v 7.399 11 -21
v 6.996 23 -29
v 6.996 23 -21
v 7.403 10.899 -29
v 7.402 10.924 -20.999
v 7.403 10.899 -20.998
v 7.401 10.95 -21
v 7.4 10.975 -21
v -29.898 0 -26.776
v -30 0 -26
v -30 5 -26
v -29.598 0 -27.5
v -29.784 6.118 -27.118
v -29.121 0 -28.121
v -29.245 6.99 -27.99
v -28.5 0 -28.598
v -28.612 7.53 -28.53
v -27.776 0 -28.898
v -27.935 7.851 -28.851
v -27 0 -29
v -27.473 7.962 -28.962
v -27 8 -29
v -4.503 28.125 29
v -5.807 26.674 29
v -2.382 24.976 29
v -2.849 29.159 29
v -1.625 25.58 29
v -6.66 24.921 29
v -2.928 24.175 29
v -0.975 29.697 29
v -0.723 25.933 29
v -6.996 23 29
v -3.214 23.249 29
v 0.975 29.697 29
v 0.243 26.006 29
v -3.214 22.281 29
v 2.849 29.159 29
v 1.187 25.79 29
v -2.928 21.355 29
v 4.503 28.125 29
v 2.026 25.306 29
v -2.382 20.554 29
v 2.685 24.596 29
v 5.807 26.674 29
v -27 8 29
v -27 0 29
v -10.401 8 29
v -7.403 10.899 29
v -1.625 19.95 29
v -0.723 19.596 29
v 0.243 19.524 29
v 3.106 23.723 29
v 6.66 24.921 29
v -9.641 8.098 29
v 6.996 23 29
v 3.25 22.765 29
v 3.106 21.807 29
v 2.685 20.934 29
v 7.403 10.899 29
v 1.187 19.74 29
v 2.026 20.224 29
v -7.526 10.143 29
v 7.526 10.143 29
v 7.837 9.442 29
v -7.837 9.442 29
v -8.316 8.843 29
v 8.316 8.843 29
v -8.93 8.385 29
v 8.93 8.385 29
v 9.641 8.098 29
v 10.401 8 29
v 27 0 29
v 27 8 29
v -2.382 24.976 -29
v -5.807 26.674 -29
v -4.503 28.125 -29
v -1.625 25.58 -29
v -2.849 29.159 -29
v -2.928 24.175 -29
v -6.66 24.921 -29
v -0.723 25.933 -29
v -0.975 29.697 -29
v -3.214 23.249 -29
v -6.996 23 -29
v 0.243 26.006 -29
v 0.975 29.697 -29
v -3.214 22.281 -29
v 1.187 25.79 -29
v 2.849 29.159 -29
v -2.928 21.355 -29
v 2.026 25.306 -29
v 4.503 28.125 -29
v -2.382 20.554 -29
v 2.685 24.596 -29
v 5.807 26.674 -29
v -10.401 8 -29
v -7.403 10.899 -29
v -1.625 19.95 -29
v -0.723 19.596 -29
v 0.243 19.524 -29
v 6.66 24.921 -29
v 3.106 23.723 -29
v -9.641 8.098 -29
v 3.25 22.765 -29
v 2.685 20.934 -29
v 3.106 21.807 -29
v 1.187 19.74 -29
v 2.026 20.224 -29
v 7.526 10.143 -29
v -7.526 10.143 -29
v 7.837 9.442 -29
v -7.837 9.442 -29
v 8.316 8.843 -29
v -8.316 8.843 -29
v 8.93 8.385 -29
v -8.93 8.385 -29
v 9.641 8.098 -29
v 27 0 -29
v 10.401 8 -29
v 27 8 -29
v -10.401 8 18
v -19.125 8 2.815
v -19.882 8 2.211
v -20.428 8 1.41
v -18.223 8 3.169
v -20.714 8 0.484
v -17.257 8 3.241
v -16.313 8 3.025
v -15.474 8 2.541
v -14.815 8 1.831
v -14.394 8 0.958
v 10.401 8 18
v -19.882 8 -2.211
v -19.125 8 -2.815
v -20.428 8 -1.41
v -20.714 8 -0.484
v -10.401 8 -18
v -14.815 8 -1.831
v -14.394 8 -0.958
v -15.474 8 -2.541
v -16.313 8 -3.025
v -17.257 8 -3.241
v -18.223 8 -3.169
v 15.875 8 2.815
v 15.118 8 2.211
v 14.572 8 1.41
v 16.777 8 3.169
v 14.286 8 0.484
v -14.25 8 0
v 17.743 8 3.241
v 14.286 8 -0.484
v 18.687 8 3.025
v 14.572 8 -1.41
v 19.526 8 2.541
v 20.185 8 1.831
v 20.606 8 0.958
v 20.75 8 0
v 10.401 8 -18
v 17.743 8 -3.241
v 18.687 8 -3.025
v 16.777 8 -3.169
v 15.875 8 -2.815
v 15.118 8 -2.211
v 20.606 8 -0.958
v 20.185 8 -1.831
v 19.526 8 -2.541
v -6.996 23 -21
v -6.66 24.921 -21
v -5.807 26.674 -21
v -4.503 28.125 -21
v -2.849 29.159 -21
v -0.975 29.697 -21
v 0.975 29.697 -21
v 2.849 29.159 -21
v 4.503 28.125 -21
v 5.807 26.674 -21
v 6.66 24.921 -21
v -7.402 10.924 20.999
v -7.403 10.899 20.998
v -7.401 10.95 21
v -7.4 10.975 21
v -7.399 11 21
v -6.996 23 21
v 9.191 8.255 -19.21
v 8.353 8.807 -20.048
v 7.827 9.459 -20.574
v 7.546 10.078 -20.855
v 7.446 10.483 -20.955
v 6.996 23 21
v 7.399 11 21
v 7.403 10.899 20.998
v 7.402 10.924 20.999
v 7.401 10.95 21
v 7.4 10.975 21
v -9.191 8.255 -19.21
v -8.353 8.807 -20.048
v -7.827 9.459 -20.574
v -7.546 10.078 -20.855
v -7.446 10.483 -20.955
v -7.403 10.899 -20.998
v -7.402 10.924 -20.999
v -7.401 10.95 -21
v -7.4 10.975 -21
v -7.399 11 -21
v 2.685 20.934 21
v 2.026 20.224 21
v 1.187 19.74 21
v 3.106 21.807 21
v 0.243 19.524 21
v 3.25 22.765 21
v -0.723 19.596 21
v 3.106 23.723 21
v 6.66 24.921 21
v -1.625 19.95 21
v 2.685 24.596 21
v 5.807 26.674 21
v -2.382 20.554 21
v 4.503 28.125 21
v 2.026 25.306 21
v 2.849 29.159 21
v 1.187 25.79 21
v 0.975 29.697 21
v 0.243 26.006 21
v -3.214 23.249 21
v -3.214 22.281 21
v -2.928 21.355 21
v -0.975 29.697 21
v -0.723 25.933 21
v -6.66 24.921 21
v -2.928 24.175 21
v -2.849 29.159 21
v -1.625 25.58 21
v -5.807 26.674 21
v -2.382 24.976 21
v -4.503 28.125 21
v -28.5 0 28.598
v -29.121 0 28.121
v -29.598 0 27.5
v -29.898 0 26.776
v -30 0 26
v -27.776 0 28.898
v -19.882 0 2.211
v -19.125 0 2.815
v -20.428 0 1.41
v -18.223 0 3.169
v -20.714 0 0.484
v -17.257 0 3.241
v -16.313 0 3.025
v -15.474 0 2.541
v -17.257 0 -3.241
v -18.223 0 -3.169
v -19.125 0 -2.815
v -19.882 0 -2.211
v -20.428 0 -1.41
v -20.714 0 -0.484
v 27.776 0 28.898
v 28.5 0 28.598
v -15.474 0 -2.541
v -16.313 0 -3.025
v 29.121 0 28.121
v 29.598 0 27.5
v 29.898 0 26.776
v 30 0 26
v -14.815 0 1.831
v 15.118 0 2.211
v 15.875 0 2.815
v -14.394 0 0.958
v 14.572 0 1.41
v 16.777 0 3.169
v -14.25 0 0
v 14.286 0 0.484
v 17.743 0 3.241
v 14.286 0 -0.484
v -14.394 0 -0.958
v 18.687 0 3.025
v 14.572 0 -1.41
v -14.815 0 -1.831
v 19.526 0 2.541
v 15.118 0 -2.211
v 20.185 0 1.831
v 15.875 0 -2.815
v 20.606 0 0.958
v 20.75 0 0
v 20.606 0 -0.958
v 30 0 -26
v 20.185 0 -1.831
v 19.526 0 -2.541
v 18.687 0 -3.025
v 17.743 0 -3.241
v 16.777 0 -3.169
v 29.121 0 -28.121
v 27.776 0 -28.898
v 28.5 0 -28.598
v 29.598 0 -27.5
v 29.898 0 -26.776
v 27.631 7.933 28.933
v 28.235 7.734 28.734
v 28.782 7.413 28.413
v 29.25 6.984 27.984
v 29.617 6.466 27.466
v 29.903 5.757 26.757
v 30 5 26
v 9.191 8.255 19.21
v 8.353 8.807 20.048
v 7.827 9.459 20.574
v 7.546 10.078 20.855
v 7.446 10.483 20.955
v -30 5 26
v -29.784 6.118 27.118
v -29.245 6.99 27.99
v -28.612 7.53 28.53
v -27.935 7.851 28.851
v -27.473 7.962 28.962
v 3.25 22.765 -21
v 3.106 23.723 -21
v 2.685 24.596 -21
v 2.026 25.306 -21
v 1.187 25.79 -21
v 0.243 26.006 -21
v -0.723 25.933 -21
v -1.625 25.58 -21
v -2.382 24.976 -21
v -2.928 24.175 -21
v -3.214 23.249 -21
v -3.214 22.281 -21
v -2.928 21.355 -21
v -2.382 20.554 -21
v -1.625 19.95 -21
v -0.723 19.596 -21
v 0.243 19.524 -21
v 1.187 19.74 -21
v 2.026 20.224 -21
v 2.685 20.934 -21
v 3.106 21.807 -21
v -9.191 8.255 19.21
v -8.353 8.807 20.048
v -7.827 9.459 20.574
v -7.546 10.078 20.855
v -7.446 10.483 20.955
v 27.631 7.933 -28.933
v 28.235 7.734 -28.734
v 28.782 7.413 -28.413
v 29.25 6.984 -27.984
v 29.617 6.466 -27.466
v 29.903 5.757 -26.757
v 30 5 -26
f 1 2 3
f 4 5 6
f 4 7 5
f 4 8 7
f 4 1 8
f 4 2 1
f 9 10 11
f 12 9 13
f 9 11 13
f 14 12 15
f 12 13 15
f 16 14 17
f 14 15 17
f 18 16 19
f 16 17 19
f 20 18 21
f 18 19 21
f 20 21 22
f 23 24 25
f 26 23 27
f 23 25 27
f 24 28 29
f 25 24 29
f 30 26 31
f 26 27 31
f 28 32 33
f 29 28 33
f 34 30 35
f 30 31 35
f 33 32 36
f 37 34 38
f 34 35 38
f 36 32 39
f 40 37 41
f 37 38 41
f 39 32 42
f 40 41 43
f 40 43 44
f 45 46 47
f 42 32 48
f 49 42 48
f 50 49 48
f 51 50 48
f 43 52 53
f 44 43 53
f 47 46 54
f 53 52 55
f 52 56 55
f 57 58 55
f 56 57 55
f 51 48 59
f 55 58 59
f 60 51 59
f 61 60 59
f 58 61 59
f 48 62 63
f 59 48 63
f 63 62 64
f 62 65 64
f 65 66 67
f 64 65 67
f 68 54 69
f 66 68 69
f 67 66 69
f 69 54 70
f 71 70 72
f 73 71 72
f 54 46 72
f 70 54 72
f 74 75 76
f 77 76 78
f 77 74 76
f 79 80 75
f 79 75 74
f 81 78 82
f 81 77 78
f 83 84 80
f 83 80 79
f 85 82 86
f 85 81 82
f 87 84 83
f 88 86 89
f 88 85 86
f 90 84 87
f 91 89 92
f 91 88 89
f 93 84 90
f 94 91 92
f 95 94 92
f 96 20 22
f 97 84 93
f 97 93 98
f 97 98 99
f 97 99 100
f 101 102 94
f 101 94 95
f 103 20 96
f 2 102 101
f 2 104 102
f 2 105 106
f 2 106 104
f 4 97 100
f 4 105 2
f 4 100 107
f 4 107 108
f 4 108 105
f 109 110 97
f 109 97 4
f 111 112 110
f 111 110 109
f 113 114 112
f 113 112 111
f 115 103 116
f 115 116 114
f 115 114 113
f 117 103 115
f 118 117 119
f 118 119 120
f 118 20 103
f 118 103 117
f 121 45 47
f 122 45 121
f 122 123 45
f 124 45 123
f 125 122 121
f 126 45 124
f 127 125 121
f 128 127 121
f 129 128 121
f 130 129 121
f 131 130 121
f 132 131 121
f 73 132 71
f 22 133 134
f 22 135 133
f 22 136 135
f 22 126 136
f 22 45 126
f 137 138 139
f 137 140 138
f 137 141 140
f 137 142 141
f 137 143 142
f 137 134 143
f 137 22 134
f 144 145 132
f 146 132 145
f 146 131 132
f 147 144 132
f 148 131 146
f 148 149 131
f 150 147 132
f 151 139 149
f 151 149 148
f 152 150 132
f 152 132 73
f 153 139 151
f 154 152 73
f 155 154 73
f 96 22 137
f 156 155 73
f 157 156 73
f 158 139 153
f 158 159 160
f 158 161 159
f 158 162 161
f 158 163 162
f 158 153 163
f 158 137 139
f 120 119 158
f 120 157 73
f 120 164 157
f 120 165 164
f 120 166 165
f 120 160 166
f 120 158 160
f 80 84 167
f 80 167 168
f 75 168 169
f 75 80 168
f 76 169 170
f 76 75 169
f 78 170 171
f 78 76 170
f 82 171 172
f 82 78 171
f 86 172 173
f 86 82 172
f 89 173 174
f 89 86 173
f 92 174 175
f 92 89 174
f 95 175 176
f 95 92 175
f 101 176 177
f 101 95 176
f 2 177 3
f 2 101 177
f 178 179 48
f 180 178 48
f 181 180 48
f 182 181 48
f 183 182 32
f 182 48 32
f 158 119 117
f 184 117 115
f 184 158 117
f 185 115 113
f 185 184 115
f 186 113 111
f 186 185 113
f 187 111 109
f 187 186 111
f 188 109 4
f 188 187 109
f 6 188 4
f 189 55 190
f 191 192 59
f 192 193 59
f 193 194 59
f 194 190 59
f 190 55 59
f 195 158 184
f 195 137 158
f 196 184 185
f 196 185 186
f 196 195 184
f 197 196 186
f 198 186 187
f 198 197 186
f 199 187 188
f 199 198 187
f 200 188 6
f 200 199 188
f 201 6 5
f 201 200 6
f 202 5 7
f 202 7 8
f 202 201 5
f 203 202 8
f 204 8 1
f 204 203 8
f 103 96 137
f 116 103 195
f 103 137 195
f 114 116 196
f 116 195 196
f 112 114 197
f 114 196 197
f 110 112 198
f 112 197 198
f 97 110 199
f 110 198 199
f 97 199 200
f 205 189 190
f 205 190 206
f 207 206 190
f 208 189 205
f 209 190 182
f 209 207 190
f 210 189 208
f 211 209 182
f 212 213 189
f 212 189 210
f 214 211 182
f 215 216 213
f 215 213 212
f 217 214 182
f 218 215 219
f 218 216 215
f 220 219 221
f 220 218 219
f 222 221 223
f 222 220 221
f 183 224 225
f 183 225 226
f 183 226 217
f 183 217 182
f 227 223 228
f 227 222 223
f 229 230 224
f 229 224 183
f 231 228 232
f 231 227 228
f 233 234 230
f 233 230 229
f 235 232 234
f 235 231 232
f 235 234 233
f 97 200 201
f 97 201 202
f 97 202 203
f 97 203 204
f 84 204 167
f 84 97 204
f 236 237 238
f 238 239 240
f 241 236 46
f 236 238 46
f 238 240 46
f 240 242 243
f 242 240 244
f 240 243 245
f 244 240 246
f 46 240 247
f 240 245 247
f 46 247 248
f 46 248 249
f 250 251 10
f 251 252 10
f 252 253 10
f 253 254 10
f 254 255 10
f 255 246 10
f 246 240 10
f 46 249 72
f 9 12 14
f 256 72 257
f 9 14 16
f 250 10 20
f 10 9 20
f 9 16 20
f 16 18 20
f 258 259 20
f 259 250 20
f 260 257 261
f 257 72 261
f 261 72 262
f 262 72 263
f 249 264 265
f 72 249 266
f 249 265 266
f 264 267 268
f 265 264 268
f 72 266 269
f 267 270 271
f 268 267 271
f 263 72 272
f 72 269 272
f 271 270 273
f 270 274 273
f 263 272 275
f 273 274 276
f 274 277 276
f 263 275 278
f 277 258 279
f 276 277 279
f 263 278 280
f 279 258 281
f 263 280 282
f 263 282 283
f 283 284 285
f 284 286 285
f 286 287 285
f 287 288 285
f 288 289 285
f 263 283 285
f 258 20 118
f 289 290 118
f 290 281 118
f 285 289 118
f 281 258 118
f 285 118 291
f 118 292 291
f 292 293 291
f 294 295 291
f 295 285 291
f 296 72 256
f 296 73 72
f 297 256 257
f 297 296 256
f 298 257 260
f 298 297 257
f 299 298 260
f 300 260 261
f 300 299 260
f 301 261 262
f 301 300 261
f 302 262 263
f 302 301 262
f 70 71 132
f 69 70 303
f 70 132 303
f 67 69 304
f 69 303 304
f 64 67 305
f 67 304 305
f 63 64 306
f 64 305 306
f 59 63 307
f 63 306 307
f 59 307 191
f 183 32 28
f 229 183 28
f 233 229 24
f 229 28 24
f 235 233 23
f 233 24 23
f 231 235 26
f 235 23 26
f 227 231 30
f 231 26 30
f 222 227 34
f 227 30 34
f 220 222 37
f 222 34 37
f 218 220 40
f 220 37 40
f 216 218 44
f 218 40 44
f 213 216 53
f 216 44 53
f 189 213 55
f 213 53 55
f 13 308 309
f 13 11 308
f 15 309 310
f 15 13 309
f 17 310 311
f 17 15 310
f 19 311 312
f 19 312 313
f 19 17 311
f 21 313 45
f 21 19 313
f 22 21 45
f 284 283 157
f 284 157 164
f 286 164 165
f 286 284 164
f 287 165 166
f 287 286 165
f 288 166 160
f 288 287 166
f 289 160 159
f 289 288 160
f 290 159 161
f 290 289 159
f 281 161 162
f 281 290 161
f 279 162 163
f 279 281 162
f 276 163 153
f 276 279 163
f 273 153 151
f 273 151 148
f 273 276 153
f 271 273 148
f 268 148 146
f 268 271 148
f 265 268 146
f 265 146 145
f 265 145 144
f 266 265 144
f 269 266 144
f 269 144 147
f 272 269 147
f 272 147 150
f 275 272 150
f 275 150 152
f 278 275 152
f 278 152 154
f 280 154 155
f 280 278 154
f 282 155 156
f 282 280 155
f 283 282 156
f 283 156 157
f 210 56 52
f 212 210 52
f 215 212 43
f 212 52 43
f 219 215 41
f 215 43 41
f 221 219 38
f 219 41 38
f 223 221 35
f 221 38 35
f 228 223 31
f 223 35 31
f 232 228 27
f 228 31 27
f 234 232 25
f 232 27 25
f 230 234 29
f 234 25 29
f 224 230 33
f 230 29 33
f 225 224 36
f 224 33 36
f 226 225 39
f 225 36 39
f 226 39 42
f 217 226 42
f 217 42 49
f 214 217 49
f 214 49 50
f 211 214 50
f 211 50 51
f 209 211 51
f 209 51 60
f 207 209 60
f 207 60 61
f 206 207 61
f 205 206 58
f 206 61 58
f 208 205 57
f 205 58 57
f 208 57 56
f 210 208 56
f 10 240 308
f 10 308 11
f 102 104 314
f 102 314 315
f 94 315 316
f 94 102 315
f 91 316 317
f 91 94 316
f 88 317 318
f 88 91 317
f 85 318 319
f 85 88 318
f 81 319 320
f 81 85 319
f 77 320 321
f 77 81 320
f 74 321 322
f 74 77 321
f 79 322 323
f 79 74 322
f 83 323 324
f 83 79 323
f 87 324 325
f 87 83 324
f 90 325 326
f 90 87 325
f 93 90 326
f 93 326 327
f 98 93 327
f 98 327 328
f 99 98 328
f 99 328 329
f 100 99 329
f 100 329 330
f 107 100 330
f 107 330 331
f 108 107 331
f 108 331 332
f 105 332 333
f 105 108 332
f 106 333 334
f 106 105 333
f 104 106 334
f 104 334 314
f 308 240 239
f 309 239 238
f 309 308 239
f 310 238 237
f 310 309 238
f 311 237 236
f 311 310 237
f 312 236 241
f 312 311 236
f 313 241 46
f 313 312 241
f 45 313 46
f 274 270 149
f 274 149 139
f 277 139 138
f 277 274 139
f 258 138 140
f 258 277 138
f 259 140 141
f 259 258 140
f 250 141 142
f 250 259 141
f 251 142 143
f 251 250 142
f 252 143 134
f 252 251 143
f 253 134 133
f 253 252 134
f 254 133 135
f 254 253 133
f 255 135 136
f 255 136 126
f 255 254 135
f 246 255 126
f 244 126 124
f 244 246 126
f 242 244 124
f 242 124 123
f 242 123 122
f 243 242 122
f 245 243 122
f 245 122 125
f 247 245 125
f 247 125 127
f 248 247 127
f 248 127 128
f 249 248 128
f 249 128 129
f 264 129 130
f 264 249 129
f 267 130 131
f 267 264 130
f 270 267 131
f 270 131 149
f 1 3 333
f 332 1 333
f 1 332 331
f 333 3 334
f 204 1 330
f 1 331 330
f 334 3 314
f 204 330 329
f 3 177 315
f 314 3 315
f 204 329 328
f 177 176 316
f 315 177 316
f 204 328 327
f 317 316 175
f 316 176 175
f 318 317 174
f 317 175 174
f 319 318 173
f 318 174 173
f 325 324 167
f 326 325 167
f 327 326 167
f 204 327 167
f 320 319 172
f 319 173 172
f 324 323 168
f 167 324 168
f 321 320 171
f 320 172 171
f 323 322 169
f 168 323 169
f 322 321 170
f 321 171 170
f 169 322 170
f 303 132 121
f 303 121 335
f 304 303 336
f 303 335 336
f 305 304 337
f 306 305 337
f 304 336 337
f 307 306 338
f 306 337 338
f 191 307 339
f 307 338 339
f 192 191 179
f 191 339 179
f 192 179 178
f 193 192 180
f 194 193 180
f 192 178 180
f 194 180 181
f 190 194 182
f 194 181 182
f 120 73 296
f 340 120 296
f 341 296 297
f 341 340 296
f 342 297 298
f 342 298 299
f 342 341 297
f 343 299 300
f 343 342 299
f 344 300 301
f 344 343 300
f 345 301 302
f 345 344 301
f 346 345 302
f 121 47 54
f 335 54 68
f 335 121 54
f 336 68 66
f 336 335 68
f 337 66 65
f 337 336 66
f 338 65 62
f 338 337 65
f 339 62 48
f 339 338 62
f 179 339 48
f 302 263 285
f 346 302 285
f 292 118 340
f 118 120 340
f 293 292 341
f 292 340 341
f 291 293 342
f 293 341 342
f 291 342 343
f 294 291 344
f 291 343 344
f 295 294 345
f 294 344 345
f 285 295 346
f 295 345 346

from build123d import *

# Parameters (mm, degrees)
SKETCH2_W           = 60
SKETCH2_H           = 58
SKETCH2_R           = 3.25
BOSS_EXTRUDE1_DEPTH = 8
SKETCH3_R           = 3.25
BOSS_EXTRUDE2_DEPTH = 8
FILLET1_R           = 3


with BuildPart() as part:
    # Sketch2 → Boss-Extrude1 (new body)
    with BuildSketch(Plane(origin=(0, 0, 0), x_dir=(1, 0, 0), z_dir=(0, 1, 0))):
        Rectangle(SKETCH2_W, SKETCH2_H)
        with Locations((-17.5, 0)):
            Circle(SKETCH2_R, mode=Mode.SUBTRACT)
        with Locations((17.5, 0)):
            Circle(SKETCH2_R, mode=Mode.SUBTRACT)
    extrude(amount=BOSS_EXTRUDE1_DEPTH)

    # Sketch3 → Boss-Extrude2 (add)
    with BuildSketch(Plane.XY.offset(29)):
        with BuildLine():
            Line((-7.5, 8), (-6.996052809, 23))
            ThreePointArc((-6.996052809, 23), (0, 29.764957256), (6.996052809, 23))
            Line((6.996052809, 23), (7.5, 8))
            Line((7.5, 8), (-7.5, 8))
        make_face()
        with Locations((0, 22.764957256)):
            Circle(SKETCH3_R, mode=Mode.SUBTRACT)
    boss_extrude2 = extrude(amount=-BOSS_EXTRUDE2_DEPTH)

    # Mirror1: Boss-Extrude2 across plane
    add(boss_extrude2.mirror(Plane.XY))

    # Fillet1
    fillet1_edges = [part.edges().sort_by_distance(p)[0] for p in [
        (-30, 8, 0),
        (0, 8, 21),
        (7.5, 8, 25),
        (-7.5, 8, 25),
        (0, 8, -21),
        (-7.5, 8, -25),
        (7.5, 8, -25),
        (30, 8, 0),
        (30, 4, 29),
        (-30, 4, 29),
        (-30, 4, -29),
        (30, 4, -29),
    ]]
    fillet(fillet1_edges, radius=FILLET1_R)


solid = part.part
